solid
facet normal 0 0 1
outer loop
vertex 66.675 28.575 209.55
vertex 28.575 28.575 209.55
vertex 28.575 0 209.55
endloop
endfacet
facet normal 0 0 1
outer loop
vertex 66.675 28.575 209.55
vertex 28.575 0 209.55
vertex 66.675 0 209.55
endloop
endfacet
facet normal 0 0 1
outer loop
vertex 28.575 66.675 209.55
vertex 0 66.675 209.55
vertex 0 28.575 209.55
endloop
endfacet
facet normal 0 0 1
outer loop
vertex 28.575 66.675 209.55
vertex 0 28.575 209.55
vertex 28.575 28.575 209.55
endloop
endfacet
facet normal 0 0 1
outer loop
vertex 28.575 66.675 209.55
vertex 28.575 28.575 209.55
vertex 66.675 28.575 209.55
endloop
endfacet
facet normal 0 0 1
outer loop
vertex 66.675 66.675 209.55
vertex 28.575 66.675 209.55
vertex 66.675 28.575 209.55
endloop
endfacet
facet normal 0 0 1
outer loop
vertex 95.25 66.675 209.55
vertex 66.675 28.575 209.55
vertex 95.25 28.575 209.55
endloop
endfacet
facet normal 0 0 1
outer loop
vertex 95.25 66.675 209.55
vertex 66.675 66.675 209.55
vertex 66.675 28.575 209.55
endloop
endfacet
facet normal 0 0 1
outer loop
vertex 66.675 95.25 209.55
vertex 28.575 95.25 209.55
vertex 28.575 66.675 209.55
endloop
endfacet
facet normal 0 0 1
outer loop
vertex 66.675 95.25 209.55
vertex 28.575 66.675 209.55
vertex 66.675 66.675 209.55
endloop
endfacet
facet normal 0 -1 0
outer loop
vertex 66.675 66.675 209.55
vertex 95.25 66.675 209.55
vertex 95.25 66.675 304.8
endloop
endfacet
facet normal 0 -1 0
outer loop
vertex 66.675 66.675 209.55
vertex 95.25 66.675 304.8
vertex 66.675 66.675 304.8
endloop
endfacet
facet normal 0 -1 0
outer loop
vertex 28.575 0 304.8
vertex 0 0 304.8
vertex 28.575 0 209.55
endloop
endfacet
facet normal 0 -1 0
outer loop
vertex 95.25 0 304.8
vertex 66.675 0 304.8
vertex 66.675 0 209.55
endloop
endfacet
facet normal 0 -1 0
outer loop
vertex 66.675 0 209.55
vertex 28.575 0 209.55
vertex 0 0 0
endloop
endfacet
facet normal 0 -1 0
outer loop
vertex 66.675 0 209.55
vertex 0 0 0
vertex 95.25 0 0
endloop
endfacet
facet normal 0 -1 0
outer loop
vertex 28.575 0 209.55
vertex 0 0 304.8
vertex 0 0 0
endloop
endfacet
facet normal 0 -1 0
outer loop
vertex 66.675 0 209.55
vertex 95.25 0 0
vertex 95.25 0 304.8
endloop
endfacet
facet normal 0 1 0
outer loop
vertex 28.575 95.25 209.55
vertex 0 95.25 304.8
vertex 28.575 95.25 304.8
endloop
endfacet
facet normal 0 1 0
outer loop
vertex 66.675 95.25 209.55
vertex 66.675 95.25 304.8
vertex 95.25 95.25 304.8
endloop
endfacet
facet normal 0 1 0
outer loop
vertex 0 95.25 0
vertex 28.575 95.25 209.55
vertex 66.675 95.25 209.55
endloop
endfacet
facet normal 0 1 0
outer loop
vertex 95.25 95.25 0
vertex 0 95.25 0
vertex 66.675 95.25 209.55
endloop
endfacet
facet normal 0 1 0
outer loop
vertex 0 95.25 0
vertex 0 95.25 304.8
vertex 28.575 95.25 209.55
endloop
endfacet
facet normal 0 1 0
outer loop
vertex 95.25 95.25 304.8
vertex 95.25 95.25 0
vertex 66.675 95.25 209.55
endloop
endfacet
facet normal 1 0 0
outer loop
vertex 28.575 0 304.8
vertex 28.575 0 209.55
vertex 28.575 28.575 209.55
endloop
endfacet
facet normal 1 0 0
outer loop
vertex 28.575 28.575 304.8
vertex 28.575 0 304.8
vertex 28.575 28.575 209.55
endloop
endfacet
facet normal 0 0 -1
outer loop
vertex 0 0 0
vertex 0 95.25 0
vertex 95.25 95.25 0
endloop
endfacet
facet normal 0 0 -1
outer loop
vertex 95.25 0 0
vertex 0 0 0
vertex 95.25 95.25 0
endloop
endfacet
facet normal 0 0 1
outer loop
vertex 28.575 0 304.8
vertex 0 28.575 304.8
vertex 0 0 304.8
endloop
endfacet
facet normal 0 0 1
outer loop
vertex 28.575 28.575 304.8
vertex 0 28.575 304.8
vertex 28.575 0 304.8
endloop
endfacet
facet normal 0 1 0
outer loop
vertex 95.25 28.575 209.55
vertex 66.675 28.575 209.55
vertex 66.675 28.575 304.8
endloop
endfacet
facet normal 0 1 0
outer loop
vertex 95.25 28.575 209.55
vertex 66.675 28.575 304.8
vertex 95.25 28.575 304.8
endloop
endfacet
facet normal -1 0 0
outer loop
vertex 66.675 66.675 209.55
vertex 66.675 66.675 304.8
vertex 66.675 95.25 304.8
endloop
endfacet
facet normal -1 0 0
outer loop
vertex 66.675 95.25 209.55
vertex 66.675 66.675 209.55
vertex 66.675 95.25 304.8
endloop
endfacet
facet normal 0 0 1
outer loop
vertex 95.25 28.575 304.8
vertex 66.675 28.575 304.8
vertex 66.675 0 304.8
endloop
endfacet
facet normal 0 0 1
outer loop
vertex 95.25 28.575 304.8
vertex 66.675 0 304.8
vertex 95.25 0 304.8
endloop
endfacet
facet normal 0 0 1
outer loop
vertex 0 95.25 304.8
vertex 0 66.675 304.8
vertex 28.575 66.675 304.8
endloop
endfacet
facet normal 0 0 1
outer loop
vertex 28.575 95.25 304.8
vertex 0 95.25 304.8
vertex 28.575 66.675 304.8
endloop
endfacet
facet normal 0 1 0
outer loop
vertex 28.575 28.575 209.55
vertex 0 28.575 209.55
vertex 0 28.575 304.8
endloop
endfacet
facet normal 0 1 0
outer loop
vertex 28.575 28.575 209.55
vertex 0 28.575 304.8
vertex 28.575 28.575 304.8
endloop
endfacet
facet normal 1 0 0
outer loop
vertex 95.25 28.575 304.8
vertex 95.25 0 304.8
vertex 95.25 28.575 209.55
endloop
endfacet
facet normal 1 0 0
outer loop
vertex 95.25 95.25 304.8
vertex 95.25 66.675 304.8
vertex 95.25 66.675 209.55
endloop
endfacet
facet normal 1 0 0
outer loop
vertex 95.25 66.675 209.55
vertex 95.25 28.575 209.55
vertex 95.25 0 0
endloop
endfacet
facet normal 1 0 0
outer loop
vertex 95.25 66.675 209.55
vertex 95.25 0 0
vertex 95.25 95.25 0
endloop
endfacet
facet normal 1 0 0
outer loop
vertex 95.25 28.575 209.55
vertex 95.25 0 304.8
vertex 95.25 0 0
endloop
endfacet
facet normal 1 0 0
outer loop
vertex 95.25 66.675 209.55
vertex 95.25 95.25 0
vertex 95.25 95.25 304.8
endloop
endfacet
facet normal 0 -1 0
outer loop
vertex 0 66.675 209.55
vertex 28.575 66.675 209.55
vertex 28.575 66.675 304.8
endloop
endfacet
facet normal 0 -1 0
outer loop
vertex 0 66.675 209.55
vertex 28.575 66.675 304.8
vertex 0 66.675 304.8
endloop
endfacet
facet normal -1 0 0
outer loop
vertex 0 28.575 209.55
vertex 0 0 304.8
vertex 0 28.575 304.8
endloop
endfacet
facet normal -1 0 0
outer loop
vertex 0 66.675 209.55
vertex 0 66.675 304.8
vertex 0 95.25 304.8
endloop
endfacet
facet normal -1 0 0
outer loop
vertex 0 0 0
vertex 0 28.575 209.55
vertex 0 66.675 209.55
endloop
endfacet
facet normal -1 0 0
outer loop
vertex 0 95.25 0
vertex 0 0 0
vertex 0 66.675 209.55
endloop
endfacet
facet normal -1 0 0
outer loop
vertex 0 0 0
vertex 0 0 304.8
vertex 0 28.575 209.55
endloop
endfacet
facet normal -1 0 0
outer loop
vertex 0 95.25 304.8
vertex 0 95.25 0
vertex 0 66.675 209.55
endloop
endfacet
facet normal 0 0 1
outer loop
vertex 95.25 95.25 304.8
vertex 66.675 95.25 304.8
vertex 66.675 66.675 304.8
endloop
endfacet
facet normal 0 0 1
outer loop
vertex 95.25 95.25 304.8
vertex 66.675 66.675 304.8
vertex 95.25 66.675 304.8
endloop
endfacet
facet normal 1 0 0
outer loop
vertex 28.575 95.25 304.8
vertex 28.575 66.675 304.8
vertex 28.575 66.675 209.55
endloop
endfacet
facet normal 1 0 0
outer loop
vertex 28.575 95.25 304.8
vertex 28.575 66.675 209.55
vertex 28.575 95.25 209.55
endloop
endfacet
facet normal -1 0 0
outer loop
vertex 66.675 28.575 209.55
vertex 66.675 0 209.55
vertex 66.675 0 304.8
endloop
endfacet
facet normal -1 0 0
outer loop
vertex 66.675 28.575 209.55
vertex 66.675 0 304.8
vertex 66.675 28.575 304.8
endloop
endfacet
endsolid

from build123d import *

# Parameters (mm, degrees)
F0_W     = 95.25
F0_H     = 95.25
F2_DEPTH = 304.8
F3_START = 209.55
F1_W     = 28.575
F1_H     = 38.1
F1_W_2   = 38.1
F1_H_2   = 28.575
F3_DEPTH = 95.25


with BuildPart() as f2:
    # F0 (on Top) → F2 (new body)
    with BuildSketch(Plane.XY):
        with Locations((47.625, 47.625)):
            Rectangle(F0_W, F0_H)
    extrude(amount=F2_DEPTH)

    # F1 (on Top) → F3 (cut)
    with BuildSketch(Plane.XY.offset(F3_START)):
        with Locations((14.2875, 47.625)):
            Rectangle(F1_W, F1_H)
        with Locations((47.625, 47.625)):
            Rectangle(F1_W_2, F1_H)
        with Locations((80.9625, 47.625)):
            Rectangle(F1_W, F1_H)
        with Locations((47.625, 80.9625)):
            Rectangle(F1_W_2, F1_H_2)
        with Locations((47.625, 14.2875)):
            Rectangle(F1_W_2, F1_H_2)
    extrude(amount=F3_DEPTH, mode=Mode.SUBTRACT)


solid = f2.part
